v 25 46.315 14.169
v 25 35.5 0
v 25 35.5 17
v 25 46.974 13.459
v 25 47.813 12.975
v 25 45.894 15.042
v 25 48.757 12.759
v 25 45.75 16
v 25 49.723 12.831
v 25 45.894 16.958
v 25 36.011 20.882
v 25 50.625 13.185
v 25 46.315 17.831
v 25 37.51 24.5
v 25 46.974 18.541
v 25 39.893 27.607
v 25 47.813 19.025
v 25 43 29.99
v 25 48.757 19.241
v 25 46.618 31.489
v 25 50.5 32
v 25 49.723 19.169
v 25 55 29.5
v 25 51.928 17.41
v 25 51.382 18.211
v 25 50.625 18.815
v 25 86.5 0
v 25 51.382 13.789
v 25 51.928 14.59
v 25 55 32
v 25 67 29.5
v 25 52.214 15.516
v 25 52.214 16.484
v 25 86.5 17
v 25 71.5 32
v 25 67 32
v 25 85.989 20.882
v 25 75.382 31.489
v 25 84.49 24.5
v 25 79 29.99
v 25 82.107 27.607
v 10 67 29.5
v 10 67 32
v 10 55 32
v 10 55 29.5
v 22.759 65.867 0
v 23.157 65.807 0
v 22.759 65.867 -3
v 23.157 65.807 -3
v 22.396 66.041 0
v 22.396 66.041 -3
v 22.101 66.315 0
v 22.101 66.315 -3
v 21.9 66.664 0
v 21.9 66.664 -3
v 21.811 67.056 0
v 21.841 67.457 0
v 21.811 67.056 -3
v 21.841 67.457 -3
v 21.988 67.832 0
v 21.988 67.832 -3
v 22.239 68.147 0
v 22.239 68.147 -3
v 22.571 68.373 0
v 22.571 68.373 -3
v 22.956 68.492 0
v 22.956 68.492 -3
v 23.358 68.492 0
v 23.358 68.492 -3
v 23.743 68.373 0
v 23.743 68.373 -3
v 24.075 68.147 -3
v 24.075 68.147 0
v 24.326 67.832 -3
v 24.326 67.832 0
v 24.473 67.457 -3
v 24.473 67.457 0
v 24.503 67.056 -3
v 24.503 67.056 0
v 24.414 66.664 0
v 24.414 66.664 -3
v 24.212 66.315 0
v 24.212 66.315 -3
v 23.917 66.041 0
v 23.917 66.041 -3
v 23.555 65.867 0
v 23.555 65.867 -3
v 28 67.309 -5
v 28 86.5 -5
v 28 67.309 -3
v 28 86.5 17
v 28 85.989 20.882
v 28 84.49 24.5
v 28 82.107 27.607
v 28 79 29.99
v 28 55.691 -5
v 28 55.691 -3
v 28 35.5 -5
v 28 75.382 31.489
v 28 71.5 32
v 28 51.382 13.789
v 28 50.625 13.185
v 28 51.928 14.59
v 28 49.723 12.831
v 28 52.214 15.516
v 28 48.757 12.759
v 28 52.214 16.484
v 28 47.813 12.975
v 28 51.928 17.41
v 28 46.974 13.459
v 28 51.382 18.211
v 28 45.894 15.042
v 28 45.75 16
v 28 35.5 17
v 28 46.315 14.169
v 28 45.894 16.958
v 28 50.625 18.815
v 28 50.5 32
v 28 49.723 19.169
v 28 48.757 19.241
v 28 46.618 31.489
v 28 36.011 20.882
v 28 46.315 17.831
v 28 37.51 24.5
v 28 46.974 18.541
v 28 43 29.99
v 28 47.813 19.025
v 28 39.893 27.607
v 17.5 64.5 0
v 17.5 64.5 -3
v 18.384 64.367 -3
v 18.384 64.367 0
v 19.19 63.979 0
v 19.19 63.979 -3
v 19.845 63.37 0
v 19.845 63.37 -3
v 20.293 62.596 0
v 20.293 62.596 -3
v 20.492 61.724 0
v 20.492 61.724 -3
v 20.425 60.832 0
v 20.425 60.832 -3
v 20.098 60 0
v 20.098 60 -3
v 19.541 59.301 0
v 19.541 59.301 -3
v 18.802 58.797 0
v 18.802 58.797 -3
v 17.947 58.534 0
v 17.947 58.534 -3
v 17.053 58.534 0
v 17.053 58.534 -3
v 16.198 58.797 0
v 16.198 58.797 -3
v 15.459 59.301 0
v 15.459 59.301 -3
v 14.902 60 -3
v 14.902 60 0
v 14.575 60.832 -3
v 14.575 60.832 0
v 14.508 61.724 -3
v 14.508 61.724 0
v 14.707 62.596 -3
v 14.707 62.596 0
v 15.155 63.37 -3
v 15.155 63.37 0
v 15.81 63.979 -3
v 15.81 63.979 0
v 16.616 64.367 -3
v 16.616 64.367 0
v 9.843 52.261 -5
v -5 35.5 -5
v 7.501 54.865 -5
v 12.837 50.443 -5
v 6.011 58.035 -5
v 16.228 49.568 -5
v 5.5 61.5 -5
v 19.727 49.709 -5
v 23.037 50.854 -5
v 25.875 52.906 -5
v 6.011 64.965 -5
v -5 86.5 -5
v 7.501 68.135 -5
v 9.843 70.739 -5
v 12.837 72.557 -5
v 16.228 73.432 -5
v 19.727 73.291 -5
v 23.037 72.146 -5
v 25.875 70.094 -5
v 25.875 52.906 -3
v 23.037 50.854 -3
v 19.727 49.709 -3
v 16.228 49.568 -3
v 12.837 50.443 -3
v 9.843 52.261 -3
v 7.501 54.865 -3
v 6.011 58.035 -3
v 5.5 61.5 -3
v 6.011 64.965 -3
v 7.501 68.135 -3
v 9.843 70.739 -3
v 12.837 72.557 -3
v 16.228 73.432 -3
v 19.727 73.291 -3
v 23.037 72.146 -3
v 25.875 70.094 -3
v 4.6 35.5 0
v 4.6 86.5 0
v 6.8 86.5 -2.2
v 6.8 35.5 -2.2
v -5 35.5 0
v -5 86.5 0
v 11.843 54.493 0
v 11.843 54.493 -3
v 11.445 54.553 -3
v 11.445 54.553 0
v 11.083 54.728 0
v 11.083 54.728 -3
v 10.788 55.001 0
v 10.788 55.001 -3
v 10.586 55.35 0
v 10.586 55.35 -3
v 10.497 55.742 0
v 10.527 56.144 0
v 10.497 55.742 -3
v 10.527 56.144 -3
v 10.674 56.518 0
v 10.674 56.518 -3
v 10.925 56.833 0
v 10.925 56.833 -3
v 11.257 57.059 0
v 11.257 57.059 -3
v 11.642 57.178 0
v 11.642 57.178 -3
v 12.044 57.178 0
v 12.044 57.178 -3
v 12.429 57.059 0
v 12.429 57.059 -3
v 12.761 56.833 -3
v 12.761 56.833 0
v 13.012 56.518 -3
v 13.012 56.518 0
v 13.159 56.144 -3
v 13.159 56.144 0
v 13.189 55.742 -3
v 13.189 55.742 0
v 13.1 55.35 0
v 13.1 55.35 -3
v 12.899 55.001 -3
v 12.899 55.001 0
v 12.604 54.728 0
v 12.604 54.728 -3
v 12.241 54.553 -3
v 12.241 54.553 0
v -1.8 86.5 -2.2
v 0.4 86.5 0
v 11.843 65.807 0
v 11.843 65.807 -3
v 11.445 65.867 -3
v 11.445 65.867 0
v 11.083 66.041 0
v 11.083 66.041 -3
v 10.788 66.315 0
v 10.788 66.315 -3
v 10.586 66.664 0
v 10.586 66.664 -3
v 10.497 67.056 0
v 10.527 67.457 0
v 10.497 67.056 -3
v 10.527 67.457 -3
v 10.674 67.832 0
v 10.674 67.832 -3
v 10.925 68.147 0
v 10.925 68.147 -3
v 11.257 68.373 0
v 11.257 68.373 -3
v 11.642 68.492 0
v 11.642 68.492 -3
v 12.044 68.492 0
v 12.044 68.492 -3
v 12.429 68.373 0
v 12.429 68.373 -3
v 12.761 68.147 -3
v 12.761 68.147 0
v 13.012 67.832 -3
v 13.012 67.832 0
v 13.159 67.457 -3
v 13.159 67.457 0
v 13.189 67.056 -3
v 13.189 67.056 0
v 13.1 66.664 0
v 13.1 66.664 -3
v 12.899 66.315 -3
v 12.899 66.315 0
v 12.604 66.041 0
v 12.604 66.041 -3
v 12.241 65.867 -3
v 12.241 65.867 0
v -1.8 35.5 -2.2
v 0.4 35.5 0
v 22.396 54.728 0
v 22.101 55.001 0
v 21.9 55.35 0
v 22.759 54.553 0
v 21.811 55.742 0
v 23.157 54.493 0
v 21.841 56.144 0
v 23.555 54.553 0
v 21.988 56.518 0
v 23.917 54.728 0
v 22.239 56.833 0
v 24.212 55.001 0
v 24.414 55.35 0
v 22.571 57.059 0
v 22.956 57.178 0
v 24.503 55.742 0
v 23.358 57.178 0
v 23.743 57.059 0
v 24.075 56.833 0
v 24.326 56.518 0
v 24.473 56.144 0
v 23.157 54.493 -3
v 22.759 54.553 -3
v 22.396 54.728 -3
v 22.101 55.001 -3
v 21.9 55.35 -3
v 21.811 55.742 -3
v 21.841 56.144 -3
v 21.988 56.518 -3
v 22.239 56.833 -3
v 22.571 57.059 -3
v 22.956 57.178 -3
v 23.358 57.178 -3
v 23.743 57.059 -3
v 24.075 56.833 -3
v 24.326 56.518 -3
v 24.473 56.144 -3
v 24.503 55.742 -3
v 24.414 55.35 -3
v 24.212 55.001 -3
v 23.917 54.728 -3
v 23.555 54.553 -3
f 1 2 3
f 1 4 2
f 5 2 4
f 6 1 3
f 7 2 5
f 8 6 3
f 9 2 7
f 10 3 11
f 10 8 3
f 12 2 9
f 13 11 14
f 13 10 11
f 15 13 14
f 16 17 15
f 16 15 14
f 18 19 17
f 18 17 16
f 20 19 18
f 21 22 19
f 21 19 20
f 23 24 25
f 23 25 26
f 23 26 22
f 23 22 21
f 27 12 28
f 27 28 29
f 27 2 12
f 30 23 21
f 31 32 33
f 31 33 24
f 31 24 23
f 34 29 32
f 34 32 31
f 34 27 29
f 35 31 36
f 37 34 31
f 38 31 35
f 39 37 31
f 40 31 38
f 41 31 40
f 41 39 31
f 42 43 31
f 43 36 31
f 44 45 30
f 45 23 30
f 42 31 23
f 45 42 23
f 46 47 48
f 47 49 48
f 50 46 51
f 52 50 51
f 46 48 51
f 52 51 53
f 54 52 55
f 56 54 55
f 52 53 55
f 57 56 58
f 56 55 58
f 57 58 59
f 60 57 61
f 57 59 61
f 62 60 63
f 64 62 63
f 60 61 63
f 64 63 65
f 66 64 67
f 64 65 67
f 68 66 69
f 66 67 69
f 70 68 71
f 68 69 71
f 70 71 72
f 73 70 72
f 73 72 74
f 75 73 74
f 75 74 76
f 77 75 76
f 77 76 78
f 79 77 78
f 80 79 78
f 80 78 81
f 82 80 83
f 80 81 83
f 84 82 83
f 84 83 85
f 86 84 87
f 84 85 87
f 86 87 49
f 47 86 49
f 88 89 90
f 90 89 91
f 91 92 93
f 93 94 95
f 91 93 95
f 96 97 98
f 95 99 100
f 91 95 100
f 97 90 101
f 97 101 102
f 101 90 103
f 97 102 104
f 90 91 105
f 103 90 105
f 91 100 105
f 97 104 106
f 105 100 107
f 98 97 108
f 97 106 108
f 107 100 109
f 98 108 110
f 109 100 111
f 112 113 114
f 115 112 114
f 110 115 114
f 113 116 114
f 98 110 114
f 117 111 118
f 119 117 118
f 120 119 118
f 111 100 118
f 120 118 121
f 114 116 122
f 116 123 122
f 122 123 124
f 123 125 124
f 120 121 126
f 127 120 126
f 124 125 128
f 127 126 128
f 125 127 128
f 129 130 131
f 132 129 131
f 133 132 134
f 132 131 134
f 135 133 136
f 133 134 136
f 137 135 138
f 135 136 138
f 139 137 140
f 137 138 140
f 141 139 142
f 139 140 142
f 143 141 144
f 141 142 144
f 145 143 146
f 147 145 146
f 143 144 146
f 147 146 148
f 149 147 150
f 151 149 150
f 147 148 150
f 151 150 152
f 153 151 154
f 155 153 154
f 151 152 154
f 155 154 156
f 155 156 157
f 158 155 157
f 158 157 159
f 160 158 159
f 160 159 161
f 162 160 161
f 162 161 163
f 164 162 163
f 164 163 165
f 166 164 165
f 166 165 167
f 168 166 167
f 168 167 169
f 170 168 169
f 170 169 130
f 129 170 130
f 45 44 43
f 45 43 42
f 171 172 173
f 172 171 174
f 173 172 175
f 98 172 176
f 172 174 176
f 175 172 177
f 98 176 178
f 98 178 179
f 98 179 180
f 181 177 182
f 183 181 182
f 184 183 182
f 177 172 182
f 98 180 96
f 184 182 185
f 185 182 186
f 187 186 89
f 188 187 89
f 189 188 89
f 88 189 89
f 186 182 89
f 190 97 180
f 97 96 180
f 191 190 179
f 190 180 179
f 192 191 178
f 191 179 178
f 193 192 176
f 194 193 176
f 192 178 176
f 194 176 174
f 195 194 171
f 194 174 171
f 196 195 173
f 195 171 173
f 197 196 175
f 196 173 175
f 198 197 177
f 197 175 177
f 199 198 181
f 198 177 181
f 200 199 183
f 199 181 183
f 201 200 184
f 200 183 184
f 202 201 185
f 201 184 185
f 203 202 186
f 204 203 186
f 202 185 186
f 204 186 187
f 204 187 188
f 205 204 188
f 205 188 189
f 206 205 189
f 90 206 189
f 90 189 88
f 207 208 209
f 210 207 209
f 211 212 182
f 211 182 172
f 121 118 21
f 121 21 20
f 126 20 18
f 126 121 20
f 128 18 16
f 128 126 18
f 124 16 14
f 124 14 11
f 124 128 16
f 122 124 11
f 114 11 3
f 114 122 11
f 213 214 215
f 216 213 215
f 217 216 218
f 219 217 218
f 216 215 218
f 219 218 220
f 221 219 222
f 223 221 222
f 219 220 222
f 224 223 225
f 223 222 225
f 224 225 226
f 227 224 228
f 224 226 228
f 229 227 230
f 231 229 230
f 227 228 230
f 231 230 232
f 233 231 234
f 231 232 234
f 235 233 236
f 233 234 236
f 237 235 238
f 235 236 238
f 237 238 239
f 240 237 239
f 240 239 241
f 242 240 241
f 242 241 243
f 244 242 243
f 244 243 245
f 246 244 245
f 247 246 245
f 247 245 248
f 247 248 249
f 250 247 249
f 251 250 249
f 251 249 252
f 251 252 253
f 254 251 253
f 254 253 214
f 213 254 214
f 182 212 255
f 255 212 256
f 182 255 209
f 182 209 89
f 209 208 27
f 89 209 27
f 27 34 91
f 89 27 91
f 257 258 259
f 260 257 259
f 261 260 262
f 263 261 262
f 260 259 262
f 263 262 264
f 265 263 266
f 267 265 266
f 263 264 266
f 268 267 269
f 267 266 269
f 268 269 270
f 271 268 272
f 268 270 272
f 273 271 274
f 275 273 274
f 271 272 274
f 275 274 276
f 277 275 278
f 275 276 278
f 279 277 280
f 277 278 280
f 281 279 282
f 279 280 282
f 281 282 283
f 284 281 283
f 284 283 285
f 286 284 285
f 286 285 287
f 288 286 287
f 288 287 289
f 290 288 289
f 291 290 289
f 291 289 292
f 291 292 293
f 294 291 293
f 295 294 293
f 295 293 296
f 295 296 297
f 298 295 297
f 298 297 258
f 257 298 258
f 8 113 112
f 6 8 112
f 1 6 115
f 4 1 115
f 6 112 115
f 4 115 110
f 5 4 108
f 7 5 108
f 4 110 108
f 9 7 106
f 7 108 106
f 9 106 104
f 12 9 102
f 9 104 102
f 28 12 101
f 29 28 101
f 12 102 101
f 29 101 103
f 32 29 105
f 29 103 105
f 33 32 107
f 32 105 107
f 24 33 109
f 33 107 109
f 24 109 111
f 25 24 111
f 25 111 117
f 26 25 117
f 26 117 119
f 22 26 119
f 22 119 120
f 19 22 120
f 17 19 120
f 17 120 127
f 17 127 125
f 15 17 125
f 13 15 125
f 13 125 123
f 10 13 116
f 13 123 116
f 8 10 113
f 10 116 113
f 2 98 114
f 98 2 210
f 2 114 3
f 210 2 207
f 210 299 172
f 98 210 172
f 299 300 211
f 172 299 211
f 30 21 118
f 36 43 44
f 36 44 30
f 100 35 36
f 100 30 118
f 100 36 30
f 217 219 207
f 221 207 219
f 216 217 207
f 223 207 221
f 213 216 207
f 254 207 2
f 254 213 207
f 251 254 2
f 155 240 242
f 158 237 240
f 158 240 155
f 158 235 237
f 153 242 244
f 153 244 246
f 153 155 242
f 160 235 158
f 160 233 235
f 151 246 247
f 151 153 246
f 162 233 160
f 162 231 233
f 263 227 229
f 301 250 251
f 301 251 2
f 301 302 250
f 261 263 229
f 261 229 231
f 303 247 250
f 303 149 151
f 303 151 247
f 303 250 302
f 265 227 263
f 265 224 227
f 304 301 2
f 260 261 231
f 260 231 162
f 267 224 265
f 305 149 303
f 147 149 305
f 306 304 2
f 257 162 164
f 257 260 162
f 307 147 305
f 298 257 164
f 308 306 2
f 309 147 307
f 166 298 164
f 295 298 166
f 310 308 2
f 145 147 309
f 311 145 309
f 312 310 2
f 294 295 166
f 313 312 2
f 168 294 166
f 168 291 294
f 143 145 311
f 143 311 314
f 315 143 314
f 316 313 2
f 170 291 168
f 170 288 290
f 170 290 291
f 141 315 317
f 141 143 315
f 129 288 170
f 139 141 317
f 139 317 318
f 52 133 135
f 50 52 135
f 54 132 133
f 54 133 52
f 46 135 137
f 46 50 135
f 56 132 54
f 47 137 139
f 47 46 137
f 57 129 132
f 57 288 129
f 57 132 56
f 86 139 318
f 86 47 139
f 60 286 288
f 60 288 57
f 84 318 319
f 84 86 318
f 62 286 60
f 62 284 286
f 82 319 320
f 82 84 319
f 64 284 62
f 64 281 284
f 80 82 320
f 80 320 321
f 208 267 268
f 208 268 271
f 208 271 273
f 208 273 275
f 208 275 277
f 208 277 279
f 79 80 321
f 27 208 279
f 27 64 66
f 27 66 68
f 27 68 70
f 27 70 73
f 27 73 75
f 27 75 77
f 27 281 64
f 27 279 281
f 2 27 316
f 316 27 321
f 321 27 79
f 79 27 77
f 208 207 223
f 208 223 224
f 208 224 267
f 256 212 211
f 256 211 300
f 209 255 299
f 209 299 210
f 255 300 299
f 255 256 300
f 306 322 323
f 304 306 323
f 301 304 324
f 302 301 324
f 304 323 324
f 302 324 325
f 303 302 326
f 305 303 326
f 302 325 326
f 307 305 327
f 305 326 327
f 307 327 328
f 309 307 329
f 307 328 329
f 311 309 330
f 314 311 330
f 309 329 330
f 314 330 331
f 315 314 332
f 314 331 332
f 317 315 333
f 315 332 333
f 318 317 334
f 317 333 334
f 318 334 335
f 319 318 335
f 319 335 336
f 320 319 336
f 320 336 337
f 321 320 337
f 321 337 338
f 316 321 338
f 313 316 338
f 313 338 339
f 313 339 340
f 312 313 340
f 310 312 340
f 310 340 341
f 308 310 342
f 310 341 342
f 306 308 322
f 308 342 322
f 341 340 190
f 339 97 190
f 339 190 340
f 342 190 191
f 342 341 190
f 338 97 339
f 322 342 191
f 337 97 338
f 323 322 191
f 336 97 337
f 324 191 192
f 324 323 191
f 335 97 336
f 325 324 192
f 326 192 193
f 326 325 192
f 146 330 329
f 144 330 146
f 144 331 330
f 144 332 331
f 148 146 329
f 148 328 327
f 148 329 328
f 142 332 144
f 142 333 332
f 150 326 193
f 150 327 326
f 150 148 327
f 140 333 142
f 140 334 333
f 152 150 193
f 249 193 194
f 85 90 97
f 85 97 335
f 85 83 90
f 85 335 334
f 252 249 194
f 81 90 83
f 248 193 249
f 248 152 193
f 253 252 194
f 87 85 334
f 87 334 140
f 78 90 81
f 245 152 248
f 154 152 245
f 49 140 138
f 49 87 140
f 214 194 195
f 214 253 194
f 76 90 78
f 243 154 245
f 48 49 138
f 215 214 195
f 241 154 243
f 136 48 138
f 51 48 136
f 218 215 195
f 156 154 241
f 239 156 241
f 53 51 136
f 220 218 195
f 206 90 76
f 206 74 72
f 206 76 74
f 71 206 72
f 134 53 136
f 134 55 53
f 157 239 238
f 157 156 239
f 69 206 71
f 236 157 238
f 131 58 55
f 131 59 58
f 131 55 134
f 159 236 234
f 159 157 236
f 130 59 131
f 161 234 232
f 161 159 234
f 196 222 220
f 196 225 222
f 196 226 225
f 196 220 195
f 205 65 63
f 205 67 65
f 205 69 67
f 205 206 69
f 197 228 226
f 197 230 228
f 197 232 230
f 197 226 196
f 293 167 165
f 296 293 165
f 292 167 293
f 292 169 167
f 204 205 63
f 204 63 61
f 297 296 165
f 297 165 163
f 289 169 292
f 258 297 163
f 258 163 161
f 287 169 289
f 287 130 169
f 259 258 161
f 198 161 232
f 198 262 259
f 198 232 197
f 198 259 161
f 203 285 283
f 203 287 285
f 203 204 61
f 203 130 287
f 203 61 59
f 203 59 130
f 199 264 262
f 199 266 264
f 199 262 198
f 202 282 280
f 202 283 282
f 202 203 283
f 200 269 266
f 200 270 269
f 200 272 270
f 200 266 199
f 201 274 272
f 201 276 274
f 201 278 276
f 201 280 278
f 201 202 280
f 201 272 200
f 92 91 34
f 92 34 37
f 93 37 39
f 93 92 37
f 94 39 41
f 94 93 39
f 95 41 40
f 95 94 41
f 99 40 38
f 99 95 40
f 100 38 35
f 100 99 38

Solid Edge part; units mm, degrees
sketch "Sketch1" plane through (0, 0, 0) normal (0, 0, -1) x (-1, 0, 0)
  line L0 (5, 86.5) -> (5, 35.5)
  line L1 (-28, 35.5) -> (5, 35.5)
  line L2 (-28, 86.5) -> (-28, 35.5)
  line L3 (5, 86.5) -> (-28, 86.5)
  dimension "D1" = 51
  dimension "D2" = 33
extrude "Protrusion1" add sketch "Sketch1" along normal blind 5
sketch "Sketch2" plane through (8, 36.5, -5) normal (0, 0, -1) x (1, 0, 0)
  circle A0 centre (9.5, -25) radius 12
  dimension "D1" = 22.5
  dimension "D2" = 25
extrude "VaciadoExtruido_1" cut sketch "Sketch2" against normal blind 2
sketch "Sketch3" plane through (8, 86.5, -2) normal (0, 1, 0) x (1, 0, 0)
  line L0 (-7.6, -2) -> (-9.8, 0.2)
  line L1 (-9.8, 0.2) -> (-5.5, 0.2)
  line L2 (-1.2, 0.2) -> (-5.5, 0.2)
  line L3 (-3.4, -2) -> (-1.2, 0.2)
  line L4 (-3.4, -2) -> (-5.5, -2)
  line L5 (-7.6, -2) -> (-5.5, -2)
extrude "Cutout1" cut sketch "Sketch3" against normal through all
sketch "Sketch4" plane through (8, 86.5, -2.5) normal (0, 1, 0) x (1, 0, 0)
  line L0 (20, -34.5) -> (20, -2.5)
  line L1 (20, -2.5) -> (17, -2.5)
  line L2 (17, -2.5) -> (17, -34.5)
  line L3 (17, -34.5) -> (20, -34.5)
extrude "ProtrusiónExtruida_4" add sketch "Sketch4" against normal blind 51
hole "Agujero_10" at (17.5, 61.5, -3) direction (0, 0, 1) diameter 6 end up to next
sketch "Sketch5" plane through (16.75, 61.5, -3) normal (0, 0, -1) x (0, -1, 0)
  circle A0 centre (-5.6569, 4.9069) radius 1.35
  circle A1 centre (-5.6569, -6.4069) radius 1.35
  circle A2 centre (5.6569, 4.9069) radius 1.35
  circle A3 centre (5.6569, -6.4069) radius 1.35
  dimension "D1" = 16
  dimension "D2" = 2.7
extrude "Cutout2" cut sketch "Sketch5" against normal through all
fillet "Redondeo_1" radius 15 1 edges at (26.5, 86.5, 32)
fillet "Redondeo_2" radius 15 1 edges at (26.5, 35.5, 32)
sketch "Sketch6" plane through (28, 61, 13.5) normal (1, 0, 0) x (0, -1, 0)
  circle A0 centre (12, -2.5) radius 3.25
extrude "Cutout3" cut sketch "Sketch6" against normal through all
sketch "Sketch7" plane through (25, 61, 16) normal (-1, 0, 0) x (0, 1, 0)
  line L0 (6, -13.5) -> (-6, -13.5)
  line L1 (-6, -13.5) -> (-6, -16)
  line L2 (-6, -16) -> (6, -16)
  line L3 (6, -16) -> (6, -13.5)
extrude "ProtrusiónExtruida_5" add sketch "Sketch7" along normal blind 15
properties material "Aluminio, 7075-T6"
